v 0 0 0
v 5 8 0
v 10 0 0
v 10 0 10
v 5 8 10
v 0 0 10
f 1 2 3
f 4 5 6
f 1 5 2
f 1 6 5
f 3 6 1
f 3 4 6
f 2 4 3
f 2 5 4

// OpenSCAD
// Extruded polygon (triangle)
linear_extrude(height=10) polygon(points=[[0,0], [10,0], [5,8]]);
